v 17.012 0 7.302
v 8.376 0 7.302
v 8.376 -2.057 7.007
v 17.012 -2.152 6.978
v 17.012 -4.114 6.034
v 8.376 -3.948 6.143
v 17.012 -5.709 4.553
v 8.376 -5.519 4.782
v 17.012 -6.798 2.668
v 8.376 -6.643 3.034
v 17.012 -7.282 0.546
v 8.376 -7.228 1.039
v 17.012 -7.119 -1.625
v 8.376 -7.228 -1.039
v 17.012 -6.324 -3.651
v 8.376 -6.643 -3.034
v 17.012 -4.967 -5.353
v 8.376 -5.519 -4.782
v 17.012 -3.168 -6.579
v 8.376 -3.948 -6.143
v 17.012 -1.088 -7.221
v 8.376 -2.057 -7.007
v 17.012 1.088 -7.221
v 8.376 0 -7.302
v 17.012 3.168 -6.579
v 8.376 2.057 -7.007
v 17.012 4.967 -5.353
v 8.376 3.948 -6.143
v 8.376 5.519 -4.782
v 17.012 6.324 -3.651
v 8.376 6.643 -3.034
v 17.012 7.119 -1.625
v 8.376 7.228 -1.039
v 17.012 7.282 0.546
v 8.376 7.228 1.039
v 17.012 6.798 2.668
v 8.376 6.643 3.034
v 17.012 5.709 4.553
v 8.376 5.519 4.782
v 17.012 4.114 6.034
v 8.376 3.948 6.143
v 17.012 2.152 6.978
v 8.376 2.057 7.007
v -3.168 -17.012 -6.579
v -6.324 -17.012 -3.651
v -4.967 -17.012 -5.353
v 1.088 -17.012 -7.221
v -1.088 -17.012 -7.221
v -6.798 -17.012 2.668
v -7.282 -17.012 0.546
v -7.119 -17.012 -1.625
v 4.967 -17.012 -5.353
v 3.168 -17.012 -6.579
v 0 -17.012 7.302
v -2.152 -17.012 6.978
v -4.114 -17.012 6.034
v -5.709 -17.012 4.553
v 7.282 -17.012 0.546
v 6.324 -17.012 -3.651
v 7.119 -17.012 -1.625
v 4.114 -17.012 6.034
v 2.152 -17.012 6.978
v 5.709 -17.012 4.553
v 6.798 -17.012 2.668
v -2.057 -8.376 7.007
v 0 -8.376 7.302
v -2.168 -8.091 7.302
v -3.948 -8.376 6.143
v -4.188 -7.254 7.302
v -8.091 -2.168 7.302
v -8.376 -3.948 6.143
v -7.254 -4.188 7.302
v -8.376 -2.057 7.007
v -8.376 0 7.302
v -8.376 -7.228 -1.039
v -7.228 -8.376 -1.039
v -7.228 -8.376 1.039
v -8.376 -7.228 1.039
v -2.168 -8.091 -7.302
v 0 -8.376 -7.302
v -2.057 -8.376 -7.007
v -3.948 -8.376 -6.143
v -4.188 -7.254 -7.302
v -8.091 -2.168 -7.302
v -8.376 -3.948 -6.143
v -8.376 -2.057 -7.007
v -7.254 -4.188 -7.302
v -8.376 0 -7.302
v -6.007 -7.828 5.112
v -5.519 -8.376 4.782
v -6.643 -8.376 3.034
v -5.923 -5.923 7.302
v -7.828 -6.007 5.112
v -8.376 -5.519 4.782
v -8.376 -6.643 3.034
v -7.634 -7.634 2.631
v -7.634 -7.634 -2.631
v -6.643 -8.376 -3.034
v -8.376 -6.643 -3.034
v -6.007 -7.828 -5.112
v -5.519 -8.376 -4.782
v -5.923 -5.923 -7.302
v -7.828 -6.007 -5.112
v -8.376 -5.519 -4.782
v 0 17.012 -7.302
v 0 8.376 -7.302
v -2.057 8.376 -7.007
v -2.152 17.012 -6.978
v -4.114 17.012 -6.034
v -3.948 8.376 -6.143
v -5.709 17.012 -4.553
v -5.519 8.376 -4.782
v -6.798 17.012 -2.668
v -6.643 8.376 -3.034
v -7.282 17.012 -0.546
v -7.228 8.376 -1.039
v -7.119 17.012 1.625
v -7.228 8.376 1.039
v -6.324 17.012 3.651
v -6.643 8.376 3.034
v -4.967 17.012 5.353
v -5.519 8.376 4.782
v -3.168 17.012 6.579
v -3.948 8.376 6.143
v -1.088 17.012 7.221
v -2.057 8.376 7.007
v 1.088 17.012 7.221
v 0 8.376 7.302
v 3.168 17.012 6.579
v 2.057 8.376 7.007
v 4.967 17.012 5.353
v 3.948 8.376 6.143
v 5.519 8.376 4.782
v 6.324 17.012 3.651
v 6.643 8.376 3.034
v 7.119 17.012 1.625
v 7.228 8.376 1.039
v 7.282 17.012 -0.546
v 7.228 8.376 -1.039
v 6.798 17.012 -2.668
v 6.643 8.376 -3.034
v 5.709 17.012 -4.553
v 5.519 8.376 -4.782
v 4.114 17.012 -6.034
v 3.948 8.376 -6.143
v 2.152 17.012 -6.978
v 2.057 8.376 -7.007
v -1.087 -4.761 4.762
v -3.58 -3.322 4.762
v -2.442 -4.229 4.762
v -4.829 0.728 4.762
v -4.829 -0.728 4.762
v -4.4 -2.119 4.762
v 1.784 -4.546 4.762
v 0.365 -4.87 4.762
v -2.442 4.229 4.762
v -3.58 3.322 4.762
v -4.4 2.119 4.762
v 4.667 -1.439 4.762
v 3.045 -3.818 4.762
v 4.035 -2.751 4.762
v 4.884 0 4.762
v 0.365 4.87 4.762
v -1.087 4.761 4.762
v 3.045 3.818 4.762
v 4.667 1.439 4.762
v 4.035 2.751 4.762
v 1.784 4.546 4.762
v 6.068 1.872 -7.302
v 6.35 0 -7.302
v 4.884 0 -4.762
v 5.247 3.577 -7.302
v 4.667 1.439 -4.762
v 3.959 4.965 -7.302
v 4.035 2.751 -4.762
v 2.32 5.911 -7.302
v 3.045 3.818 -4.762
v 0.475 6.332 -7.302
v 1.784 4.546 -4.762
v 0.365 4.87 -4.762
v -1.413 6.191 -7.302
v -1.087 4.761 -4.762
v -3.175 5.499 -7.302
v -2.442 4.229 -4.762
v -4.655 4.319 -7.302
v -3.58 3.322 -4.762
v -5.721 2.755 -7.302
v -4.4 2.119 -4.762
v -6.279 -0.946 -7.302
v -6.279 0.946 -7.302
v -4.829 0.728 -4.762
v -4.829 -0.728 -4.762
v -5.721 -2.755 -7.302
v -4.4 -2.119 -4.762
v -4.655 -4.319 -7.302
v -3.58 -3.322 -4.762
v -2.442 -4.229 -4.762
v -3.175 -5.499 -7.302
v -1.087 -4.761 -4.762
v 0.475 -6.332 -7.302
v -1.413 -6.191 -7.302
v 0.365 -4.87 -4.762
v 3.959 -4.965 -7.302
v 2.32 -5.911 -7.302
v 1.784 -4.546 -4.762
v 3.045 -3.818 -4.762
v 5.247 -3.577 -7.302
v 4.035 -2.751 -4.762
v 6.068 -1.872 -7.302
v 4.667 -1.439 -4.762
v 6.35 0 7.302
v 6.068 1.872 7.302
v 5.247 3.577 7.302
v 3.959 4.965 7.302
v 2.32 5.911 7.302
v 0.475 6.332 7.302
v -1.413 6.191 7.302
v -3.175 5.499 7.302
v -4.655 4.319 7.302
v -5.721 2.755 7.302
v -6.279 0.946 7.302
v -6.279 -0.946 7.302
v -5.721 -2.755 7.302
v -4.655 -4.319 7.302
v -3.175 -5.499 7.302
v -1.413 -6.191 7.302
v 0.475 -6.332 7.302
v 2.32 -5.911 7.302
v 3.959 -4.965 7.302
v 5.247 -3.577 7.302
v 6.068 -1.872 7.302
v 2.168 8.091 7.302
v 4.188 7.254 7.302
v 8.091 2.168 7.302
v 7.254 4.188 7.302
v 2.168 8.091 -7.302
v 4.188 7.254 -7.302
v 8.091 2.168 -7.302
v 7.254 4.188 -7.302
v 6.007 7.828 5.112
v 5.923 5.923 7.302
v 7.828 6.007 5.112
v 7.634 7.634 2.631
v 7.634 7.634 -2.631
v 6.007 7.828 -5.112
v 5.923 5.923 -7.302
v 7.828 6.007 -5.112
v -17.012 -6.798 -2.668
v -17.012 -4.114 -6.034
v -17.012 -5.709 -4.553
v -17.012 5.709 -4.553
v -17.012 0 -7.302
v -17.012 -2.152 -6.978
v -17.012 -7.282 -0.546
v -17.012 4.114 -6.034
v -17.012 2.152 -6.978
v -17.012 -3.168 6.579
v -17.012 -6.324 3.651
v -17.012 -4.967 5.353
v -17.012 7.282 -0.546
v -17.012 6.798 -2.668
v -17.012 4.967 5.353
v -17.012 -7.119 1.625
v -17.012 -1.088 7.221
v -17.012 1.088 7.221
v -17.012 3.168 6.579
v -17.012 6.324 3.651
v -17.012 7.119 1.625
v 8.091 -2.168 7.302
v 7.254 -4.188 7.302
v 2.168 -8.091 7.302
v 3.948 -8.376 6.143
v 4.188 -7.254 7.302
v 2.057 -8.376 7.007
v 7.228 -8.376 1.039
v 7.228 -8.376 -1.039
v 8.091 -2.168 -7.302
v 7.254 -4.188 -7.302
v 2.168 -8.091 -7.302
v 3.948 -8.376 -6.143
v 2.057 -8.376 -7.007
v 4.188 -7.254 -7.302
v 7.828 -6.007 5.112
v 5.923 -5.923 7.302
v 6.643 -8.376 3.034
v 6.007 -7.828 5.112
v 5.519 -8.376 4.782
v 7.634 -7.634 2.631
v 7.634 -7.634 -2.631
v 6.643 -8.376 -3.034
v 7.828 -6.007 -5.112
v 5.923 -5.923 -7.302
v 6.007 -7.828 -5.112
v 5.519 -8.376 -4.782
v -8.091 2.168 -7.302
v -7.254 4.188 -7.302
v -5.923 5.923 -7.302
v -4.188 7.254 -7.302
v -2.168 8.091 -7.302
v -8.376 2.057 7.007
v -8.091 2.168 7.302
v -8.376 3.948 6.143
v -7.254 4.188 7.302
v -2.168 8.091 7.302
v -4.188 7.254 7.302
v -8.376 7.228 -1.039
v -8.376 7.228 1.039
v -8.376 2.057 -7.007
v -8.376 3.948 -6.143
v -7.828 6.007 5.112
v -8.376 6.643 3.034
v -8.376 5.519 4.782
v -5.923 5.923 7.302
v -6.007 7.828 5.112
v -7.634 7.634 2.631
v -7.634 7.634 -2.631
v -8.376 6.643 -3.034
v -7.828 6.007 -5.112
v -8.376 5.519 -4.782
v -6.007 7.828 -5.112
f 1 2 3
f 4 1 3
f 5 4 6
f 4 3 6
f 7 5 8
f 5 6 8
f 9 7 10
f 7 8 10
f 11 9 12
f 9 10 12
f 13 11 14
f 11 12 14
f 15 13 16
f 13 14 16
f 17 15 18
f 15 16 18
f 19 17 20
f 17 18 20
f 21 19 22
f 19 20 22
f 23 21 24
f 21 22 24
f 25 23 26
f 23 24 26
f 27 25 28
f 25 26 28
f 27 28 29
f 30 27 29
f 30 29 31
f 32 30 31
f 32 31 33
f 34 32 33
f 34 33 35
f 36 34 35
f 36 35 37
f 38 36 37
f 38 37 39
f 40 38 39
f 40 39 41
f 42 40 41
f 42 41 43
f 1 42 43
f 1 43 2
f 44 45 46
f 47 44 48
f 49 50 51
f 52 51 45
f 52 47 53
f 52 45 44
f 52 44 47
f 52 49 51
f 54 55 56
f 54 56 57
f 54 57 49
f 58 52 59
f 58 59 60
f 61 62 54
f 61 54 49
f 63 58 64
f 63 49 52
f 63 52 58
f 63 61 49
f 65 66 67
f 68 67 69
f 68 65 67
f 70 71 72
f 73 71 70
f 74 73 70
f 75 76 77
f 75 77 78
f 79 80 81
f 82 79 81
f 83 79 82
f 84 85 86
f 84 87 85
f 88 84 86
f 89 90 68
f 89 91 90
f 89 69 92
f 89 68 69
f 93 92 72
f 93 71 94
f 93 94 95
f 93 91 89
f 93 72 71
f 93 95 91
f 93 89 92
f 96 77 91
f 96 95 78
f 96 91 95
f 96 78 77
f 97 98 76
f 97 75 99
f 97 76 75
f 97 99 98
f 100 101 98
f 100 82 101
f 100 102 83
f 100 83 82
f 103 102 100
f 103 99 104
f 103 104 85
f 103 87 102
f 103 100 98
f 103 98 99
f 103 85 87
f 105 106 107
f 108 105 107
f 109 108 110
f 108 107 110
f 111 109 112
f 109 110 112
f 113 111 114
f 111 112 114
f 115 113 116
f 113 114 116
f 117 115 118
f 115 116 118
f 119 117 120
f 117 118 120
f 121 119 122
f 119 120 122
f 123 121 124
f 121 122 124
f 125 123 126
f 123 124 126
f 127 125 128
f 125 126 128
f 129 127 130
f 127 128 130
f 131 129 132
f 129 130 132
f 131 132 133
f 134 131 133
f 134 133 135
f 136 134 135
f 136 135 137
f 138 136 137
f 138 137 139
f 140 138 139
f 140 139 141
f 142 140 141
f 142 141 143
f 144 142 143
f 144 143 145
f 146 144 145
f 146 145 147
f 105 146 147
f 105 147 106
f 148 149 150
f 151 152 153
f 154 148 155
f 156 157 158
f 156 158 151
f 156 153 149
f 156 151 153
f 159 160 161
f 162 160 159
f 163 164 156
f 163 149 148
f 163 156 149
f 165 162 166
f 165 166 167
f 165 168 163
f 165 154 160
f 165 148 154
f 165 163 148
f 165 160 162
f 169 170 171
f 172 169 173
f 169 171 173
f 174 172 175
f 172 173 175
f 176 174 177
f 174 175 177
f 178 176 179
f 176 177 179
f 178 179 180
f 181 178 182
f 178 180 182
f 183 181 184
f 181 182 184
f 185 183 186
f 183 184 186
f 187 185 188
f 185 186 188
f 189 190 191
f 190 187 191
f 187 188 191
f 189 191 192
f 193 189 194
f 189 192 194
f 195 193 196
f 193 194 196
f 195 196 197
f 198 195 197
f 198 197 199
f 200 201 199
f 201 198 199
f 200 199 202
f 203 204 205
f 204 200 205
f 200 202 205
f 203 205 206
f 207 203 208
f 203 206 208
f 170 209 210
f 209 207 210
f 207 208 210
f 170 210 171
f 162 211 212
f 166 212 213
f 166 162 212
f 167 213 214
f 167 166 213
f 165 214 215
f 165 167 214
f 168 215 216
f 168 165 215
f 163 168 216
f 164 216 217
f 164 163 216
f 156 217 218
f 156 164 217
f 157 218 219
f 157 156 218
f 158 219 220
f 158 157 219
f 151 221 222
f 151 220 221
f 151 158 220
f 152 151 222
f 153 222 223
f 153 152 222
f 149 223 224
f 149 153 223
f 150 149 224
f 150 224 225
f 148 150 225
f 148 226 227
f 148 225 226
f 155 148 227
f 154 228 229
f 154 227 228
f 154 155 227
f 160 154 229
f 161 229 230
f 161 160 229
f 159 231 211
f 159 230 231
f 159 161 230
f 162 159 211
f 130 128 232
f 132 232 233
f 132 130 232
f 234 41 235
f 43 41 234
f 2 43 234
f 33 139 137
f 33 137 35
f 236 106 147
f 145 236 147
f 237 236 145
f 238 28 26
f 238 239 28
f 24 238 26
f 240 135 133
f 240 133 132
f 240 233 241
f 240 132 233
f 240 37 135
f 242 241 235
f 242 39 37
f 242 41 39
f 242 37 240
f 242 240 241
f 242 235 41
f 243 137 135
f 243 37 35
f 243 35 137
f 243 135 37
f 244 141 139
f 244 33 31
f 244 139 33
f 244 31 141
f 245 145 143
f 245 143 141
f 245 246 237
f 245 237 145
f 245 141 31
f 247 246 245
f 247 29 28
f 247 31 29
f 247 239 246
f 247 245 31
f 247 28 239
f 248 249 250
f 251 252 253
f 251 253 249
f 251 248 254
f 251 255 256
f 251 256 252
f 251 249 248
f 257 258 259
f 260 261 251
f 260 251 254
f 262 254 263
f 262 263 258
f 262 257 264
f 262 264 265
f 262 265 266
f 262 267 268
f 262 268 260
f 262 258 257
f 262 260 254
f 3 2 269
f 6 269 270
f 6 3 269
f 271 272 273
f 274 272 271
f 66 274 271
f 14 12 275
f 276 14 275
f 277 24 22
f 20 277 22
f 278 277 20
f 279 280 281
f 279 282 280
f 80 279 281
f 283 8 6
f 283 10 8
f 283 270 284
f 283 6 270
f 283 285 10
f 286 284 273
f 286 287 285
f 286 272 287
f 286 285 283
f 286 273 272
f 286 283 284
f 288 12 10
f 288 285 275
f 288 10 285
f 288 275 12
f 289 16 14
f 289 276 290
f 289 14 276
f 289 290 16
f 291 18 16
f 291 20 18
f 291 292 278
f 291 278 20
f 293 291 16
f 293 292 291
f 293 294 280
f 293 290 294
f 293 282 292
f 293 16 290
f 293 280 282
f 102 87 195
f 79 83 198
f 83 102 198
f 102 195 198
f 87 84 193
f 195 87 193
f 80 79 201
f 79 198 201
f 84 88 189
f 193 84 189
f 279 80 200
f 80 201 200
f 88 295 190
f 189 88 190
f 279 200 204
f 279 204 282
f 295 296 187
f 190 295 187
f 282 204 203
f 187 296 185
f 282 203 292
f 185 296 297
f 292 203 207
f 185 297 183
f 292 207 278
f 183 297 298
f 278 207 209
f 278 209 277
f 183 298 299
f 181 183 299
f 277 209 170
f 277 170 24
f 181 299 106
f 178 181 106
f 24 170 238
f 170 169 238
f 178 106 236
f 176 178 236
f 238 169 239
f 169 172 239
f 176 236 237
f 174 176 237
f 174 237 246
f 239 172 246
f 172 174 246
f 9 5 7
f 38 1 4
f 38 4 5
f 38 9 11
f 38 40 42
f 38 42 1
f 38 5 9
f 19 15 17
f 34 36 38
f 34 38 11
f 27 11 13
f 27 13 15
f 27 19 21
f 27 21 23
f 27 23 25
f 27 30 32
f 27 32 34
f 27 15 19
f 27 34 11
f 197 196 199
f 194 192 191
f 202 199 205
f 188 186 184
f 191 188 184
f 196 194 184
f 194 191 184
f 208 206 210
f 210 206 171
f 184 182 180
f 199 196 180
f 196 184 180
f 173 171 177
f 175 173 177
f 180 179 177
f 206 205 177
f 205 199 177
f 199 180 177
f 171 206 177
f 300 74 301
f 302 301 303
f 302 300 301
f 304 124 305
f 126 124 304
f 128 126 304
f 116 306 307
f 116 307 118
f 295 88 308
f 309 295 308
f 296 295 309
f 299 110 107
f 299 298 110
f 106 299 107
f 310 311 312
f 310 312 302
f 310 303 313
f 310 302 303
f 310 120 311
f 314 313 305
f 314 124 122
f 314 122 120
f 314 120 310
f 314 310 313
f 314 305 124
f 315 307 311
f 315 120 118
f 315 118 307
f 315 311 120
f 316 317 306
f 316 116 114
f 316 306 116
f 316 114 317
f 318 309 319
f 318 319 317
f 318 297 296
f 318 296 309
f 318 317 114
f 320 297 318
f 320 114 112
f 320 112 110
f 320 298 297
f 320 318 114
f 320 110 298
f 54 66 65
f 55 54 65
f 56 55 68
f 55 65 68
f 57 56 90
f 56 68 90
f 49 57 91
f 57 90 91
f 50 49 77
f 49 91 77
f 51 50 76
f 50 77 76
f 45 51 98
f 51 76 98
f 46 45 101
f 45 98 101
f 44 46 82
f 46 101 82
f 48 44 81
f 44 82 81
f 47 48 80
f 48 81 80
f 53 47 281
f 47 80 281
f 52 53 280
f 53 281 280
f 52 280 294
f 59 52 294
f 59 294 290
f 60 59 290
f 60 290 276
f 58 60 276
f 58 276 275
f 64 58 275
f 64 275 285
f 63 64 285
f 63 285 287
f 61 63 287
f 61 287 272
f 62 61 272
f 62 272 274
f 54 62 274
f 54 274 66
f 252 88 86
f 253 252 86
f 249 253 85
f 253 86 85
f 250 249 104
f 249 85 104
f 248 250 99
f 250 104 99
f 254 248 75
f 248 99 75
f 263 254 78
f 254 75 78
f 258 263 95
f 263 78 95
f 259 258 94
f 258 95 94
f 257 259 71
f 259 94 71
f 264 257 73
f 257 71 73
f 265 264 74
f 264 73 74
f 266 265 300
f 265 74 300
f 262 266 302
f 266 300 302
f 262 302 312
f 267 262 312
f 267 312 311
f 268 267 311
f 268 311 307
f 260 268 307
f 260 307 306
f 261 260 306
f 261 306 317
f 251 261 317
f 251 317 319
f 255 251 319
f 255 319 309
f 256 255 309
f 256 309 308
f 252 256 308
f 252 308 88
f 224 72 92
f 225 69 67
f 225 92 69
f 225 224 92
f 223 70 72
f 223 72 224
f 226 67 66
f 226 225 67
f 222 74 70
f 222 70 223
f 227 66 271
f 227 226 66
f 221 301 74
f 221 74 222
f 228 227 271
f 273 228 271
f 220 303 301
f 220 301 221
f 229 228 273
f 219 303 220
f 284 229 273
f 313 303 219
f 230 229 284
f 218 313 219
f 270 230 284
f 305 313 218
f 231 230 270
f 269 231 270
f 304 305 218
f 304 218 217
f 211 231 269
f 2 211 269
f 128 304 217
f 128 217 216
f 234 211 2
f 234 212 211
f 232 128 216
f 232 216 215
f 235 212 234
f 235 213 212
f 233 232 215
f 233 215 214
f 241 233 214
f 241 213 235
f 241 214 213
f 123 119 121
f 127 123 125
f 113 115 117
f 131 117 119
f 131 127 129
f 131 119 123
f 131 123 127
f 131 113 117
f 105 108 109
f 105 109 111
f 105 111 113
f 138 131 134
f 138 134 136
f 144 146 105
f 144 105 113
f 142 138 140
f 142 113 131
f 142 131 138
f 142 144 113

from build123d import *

# Parameters (mm, degrees)
SKETCH2_OUTSIDE_W   = 31.923
SKETCH2_OUTSIDE_H   = 31.922
SKETCH2_OUTSIDE_W_2 = 16.752450568
SKETCH2_OUTSIDE_H_2 = 14.605
CUT_EXTRUDE1_DEPTH  = 10.287
SKETCH3_OUTSIDE_W   = 22.89
SKETCH3_OUTSIDE_H   = 30.51
SKETCH3_OUTSIDE_W_2 = 14.605
SKETCH3_OUTSIDE_H_2 = 16.752450568
CUT_EXTRUDE3_DEPTH  = 11.303
SKETCH6_R           = 6.35
CUT_EXTRUDE4_DEPTH  = 2.54
CUT_EXTRUDE4_TAPER  = 30
BOSS_EXTRUDE1_DEPTH = 8.636
BOSS_EXTRUDE2_DEPTH = 8.636
BOSS_EXTRUDE3_DEPTH = 8.636
BOSS_EXTRUDE4_DEPTH = 8.636


with BuildPart() as part:
    # Sketch1 → Revolve1 (revolve)
    with BuildSketch(Plane(origin=(0, 0, 0), x_dir=(1, 0, 0), z_dir=(0, 1, 0))):
        with BuildLine():
            Line((0, 11.1125), (0, -11.1125))
            ThreePointArc((0, -11.1125), (11.1125, 0), (0, 11.1125))
        make_face()
    revolve(axis=Axis((0, 0, 7.836824486), (0, 0, -1)))

    # Sketch2 outside → Cut-Extrude1 (cut, symmetric)
    with BuildSketch(Plane(origin=(0, 0, 0), x_dir=(1, 0, 0), z_dir=(0, 1, 0))):
        with Locations((-0.0005, 0)):
            Rectangle(SKETCH2_OUTSIDE_W, SKETCH2_OUTSIDE_H)
        Rectangle(SKETCH2_OUTSIDE_W_2, SKETCH2_OUTSIDE_H_2, mode=Mode.SUBTRACT)
    extrude(amount=CUT_EXTRUDE1_DEPTH, both=True, mode=Mode.SUBTRACT)

    # Sketch3 outside → Cut-Extrude3 (cut, symmetric)
    with BuildSketch(Plane(origin=(0, 0, 0), x_dir=(0, 0, -1), z_dir=(1, 0, 0))):
        Rectangle(SKETCH3_OUTSIDE_W, SKETCH3_OUTSIDE_H)
        Rectangle(SKETCH3_OUTSIDE_W_2, SKETCH3_OUTSIDE_H_2, mode=Mode.SUBTRACT)
    extrude(amount=CUT_EXTRUDE3_DEPTH, both=True, mode=Mode.SUBTRACT)

    # Sketch6 → Cut-Extrude4 (cut)
    with BuildSketch(Plane.XY.offset(7.3025)):
        Circle(SKETCH6_R)
    cut_extrude4 = extrude(amount=-CUT_EXTRUDE4_DEPTH, taper=CUT_EXTRUDE4_TAPER, mode=Mode.SUBTRACT)

    # Mirror1: Cut-Extrude4 across plane
    add(cut_extrude4.mirror(Plane.XY), mode=Mode.SUBTRACT)

    # Sketch7 → Boss-Extrude1 (add)
    with BuildSketch(Plane(origin=(8.376225284, 0, 0), x_dir=(0, 0, -1), z_dir=(1, 0, 0))):
        with BuildLine():
            ThreePointArc((7.3025, 0), (0, 7.3025), (-7.3025, 0))
            ThreePointArc((-7.3025, 0), (0, -7.3025), (7.3025, 0))
        make_face()
    extrude(amount=BOSS_EXTRUDE1_DEPTH)

    # Sketch11 → Boss-Extrude2 (add)
    with BuildSketch(Plane(origin=(0, 8.376225284, 0), x_dir=(1, 0, 0), z_dir=(0, 1, 0))):
        with BuildLine():
            ThreePointArc((0, -7.3025), (7.3025, 0), (0, 7.3025))
            ThreePointArc((0, 7.3025), (-7.3025, 0), (0, -7.3025))
        make_face()
    extrude(amount=BOSS_EXTRUDE2_DEPTH)

    # Sketch12 → Boss-Extrude3 (add)
    with BuildSketch(Plane.ZY.offset(8.376225284)):
        with BuildLine():
            ThreePointArc((7.3025, 0), (0, 7.3025), (-7.3025, 0))
            ThreePointArc((-7.3025, 0), (0, -7.3025), (7.3025, 0))
        make_face()
    extrude(amount=BOSS_EXTRUDE3_DEPTH)

    # Sketch13 → Boss-Extrude4 (add)
    with BuildSketch(Plane.XZ.offset(8.376225284)):
        with BuildLine():
            ThreePointArc((0, -7.3025), (7.3025, 0), (0, 7.3025))
            ThreePointArc((0, 7.3025), (-7.3025, 0), (0, -7.3025))
        make_face()
    extrude(amount=BOSS_EXTRUDE4_DEPTH)


solid = part.part
